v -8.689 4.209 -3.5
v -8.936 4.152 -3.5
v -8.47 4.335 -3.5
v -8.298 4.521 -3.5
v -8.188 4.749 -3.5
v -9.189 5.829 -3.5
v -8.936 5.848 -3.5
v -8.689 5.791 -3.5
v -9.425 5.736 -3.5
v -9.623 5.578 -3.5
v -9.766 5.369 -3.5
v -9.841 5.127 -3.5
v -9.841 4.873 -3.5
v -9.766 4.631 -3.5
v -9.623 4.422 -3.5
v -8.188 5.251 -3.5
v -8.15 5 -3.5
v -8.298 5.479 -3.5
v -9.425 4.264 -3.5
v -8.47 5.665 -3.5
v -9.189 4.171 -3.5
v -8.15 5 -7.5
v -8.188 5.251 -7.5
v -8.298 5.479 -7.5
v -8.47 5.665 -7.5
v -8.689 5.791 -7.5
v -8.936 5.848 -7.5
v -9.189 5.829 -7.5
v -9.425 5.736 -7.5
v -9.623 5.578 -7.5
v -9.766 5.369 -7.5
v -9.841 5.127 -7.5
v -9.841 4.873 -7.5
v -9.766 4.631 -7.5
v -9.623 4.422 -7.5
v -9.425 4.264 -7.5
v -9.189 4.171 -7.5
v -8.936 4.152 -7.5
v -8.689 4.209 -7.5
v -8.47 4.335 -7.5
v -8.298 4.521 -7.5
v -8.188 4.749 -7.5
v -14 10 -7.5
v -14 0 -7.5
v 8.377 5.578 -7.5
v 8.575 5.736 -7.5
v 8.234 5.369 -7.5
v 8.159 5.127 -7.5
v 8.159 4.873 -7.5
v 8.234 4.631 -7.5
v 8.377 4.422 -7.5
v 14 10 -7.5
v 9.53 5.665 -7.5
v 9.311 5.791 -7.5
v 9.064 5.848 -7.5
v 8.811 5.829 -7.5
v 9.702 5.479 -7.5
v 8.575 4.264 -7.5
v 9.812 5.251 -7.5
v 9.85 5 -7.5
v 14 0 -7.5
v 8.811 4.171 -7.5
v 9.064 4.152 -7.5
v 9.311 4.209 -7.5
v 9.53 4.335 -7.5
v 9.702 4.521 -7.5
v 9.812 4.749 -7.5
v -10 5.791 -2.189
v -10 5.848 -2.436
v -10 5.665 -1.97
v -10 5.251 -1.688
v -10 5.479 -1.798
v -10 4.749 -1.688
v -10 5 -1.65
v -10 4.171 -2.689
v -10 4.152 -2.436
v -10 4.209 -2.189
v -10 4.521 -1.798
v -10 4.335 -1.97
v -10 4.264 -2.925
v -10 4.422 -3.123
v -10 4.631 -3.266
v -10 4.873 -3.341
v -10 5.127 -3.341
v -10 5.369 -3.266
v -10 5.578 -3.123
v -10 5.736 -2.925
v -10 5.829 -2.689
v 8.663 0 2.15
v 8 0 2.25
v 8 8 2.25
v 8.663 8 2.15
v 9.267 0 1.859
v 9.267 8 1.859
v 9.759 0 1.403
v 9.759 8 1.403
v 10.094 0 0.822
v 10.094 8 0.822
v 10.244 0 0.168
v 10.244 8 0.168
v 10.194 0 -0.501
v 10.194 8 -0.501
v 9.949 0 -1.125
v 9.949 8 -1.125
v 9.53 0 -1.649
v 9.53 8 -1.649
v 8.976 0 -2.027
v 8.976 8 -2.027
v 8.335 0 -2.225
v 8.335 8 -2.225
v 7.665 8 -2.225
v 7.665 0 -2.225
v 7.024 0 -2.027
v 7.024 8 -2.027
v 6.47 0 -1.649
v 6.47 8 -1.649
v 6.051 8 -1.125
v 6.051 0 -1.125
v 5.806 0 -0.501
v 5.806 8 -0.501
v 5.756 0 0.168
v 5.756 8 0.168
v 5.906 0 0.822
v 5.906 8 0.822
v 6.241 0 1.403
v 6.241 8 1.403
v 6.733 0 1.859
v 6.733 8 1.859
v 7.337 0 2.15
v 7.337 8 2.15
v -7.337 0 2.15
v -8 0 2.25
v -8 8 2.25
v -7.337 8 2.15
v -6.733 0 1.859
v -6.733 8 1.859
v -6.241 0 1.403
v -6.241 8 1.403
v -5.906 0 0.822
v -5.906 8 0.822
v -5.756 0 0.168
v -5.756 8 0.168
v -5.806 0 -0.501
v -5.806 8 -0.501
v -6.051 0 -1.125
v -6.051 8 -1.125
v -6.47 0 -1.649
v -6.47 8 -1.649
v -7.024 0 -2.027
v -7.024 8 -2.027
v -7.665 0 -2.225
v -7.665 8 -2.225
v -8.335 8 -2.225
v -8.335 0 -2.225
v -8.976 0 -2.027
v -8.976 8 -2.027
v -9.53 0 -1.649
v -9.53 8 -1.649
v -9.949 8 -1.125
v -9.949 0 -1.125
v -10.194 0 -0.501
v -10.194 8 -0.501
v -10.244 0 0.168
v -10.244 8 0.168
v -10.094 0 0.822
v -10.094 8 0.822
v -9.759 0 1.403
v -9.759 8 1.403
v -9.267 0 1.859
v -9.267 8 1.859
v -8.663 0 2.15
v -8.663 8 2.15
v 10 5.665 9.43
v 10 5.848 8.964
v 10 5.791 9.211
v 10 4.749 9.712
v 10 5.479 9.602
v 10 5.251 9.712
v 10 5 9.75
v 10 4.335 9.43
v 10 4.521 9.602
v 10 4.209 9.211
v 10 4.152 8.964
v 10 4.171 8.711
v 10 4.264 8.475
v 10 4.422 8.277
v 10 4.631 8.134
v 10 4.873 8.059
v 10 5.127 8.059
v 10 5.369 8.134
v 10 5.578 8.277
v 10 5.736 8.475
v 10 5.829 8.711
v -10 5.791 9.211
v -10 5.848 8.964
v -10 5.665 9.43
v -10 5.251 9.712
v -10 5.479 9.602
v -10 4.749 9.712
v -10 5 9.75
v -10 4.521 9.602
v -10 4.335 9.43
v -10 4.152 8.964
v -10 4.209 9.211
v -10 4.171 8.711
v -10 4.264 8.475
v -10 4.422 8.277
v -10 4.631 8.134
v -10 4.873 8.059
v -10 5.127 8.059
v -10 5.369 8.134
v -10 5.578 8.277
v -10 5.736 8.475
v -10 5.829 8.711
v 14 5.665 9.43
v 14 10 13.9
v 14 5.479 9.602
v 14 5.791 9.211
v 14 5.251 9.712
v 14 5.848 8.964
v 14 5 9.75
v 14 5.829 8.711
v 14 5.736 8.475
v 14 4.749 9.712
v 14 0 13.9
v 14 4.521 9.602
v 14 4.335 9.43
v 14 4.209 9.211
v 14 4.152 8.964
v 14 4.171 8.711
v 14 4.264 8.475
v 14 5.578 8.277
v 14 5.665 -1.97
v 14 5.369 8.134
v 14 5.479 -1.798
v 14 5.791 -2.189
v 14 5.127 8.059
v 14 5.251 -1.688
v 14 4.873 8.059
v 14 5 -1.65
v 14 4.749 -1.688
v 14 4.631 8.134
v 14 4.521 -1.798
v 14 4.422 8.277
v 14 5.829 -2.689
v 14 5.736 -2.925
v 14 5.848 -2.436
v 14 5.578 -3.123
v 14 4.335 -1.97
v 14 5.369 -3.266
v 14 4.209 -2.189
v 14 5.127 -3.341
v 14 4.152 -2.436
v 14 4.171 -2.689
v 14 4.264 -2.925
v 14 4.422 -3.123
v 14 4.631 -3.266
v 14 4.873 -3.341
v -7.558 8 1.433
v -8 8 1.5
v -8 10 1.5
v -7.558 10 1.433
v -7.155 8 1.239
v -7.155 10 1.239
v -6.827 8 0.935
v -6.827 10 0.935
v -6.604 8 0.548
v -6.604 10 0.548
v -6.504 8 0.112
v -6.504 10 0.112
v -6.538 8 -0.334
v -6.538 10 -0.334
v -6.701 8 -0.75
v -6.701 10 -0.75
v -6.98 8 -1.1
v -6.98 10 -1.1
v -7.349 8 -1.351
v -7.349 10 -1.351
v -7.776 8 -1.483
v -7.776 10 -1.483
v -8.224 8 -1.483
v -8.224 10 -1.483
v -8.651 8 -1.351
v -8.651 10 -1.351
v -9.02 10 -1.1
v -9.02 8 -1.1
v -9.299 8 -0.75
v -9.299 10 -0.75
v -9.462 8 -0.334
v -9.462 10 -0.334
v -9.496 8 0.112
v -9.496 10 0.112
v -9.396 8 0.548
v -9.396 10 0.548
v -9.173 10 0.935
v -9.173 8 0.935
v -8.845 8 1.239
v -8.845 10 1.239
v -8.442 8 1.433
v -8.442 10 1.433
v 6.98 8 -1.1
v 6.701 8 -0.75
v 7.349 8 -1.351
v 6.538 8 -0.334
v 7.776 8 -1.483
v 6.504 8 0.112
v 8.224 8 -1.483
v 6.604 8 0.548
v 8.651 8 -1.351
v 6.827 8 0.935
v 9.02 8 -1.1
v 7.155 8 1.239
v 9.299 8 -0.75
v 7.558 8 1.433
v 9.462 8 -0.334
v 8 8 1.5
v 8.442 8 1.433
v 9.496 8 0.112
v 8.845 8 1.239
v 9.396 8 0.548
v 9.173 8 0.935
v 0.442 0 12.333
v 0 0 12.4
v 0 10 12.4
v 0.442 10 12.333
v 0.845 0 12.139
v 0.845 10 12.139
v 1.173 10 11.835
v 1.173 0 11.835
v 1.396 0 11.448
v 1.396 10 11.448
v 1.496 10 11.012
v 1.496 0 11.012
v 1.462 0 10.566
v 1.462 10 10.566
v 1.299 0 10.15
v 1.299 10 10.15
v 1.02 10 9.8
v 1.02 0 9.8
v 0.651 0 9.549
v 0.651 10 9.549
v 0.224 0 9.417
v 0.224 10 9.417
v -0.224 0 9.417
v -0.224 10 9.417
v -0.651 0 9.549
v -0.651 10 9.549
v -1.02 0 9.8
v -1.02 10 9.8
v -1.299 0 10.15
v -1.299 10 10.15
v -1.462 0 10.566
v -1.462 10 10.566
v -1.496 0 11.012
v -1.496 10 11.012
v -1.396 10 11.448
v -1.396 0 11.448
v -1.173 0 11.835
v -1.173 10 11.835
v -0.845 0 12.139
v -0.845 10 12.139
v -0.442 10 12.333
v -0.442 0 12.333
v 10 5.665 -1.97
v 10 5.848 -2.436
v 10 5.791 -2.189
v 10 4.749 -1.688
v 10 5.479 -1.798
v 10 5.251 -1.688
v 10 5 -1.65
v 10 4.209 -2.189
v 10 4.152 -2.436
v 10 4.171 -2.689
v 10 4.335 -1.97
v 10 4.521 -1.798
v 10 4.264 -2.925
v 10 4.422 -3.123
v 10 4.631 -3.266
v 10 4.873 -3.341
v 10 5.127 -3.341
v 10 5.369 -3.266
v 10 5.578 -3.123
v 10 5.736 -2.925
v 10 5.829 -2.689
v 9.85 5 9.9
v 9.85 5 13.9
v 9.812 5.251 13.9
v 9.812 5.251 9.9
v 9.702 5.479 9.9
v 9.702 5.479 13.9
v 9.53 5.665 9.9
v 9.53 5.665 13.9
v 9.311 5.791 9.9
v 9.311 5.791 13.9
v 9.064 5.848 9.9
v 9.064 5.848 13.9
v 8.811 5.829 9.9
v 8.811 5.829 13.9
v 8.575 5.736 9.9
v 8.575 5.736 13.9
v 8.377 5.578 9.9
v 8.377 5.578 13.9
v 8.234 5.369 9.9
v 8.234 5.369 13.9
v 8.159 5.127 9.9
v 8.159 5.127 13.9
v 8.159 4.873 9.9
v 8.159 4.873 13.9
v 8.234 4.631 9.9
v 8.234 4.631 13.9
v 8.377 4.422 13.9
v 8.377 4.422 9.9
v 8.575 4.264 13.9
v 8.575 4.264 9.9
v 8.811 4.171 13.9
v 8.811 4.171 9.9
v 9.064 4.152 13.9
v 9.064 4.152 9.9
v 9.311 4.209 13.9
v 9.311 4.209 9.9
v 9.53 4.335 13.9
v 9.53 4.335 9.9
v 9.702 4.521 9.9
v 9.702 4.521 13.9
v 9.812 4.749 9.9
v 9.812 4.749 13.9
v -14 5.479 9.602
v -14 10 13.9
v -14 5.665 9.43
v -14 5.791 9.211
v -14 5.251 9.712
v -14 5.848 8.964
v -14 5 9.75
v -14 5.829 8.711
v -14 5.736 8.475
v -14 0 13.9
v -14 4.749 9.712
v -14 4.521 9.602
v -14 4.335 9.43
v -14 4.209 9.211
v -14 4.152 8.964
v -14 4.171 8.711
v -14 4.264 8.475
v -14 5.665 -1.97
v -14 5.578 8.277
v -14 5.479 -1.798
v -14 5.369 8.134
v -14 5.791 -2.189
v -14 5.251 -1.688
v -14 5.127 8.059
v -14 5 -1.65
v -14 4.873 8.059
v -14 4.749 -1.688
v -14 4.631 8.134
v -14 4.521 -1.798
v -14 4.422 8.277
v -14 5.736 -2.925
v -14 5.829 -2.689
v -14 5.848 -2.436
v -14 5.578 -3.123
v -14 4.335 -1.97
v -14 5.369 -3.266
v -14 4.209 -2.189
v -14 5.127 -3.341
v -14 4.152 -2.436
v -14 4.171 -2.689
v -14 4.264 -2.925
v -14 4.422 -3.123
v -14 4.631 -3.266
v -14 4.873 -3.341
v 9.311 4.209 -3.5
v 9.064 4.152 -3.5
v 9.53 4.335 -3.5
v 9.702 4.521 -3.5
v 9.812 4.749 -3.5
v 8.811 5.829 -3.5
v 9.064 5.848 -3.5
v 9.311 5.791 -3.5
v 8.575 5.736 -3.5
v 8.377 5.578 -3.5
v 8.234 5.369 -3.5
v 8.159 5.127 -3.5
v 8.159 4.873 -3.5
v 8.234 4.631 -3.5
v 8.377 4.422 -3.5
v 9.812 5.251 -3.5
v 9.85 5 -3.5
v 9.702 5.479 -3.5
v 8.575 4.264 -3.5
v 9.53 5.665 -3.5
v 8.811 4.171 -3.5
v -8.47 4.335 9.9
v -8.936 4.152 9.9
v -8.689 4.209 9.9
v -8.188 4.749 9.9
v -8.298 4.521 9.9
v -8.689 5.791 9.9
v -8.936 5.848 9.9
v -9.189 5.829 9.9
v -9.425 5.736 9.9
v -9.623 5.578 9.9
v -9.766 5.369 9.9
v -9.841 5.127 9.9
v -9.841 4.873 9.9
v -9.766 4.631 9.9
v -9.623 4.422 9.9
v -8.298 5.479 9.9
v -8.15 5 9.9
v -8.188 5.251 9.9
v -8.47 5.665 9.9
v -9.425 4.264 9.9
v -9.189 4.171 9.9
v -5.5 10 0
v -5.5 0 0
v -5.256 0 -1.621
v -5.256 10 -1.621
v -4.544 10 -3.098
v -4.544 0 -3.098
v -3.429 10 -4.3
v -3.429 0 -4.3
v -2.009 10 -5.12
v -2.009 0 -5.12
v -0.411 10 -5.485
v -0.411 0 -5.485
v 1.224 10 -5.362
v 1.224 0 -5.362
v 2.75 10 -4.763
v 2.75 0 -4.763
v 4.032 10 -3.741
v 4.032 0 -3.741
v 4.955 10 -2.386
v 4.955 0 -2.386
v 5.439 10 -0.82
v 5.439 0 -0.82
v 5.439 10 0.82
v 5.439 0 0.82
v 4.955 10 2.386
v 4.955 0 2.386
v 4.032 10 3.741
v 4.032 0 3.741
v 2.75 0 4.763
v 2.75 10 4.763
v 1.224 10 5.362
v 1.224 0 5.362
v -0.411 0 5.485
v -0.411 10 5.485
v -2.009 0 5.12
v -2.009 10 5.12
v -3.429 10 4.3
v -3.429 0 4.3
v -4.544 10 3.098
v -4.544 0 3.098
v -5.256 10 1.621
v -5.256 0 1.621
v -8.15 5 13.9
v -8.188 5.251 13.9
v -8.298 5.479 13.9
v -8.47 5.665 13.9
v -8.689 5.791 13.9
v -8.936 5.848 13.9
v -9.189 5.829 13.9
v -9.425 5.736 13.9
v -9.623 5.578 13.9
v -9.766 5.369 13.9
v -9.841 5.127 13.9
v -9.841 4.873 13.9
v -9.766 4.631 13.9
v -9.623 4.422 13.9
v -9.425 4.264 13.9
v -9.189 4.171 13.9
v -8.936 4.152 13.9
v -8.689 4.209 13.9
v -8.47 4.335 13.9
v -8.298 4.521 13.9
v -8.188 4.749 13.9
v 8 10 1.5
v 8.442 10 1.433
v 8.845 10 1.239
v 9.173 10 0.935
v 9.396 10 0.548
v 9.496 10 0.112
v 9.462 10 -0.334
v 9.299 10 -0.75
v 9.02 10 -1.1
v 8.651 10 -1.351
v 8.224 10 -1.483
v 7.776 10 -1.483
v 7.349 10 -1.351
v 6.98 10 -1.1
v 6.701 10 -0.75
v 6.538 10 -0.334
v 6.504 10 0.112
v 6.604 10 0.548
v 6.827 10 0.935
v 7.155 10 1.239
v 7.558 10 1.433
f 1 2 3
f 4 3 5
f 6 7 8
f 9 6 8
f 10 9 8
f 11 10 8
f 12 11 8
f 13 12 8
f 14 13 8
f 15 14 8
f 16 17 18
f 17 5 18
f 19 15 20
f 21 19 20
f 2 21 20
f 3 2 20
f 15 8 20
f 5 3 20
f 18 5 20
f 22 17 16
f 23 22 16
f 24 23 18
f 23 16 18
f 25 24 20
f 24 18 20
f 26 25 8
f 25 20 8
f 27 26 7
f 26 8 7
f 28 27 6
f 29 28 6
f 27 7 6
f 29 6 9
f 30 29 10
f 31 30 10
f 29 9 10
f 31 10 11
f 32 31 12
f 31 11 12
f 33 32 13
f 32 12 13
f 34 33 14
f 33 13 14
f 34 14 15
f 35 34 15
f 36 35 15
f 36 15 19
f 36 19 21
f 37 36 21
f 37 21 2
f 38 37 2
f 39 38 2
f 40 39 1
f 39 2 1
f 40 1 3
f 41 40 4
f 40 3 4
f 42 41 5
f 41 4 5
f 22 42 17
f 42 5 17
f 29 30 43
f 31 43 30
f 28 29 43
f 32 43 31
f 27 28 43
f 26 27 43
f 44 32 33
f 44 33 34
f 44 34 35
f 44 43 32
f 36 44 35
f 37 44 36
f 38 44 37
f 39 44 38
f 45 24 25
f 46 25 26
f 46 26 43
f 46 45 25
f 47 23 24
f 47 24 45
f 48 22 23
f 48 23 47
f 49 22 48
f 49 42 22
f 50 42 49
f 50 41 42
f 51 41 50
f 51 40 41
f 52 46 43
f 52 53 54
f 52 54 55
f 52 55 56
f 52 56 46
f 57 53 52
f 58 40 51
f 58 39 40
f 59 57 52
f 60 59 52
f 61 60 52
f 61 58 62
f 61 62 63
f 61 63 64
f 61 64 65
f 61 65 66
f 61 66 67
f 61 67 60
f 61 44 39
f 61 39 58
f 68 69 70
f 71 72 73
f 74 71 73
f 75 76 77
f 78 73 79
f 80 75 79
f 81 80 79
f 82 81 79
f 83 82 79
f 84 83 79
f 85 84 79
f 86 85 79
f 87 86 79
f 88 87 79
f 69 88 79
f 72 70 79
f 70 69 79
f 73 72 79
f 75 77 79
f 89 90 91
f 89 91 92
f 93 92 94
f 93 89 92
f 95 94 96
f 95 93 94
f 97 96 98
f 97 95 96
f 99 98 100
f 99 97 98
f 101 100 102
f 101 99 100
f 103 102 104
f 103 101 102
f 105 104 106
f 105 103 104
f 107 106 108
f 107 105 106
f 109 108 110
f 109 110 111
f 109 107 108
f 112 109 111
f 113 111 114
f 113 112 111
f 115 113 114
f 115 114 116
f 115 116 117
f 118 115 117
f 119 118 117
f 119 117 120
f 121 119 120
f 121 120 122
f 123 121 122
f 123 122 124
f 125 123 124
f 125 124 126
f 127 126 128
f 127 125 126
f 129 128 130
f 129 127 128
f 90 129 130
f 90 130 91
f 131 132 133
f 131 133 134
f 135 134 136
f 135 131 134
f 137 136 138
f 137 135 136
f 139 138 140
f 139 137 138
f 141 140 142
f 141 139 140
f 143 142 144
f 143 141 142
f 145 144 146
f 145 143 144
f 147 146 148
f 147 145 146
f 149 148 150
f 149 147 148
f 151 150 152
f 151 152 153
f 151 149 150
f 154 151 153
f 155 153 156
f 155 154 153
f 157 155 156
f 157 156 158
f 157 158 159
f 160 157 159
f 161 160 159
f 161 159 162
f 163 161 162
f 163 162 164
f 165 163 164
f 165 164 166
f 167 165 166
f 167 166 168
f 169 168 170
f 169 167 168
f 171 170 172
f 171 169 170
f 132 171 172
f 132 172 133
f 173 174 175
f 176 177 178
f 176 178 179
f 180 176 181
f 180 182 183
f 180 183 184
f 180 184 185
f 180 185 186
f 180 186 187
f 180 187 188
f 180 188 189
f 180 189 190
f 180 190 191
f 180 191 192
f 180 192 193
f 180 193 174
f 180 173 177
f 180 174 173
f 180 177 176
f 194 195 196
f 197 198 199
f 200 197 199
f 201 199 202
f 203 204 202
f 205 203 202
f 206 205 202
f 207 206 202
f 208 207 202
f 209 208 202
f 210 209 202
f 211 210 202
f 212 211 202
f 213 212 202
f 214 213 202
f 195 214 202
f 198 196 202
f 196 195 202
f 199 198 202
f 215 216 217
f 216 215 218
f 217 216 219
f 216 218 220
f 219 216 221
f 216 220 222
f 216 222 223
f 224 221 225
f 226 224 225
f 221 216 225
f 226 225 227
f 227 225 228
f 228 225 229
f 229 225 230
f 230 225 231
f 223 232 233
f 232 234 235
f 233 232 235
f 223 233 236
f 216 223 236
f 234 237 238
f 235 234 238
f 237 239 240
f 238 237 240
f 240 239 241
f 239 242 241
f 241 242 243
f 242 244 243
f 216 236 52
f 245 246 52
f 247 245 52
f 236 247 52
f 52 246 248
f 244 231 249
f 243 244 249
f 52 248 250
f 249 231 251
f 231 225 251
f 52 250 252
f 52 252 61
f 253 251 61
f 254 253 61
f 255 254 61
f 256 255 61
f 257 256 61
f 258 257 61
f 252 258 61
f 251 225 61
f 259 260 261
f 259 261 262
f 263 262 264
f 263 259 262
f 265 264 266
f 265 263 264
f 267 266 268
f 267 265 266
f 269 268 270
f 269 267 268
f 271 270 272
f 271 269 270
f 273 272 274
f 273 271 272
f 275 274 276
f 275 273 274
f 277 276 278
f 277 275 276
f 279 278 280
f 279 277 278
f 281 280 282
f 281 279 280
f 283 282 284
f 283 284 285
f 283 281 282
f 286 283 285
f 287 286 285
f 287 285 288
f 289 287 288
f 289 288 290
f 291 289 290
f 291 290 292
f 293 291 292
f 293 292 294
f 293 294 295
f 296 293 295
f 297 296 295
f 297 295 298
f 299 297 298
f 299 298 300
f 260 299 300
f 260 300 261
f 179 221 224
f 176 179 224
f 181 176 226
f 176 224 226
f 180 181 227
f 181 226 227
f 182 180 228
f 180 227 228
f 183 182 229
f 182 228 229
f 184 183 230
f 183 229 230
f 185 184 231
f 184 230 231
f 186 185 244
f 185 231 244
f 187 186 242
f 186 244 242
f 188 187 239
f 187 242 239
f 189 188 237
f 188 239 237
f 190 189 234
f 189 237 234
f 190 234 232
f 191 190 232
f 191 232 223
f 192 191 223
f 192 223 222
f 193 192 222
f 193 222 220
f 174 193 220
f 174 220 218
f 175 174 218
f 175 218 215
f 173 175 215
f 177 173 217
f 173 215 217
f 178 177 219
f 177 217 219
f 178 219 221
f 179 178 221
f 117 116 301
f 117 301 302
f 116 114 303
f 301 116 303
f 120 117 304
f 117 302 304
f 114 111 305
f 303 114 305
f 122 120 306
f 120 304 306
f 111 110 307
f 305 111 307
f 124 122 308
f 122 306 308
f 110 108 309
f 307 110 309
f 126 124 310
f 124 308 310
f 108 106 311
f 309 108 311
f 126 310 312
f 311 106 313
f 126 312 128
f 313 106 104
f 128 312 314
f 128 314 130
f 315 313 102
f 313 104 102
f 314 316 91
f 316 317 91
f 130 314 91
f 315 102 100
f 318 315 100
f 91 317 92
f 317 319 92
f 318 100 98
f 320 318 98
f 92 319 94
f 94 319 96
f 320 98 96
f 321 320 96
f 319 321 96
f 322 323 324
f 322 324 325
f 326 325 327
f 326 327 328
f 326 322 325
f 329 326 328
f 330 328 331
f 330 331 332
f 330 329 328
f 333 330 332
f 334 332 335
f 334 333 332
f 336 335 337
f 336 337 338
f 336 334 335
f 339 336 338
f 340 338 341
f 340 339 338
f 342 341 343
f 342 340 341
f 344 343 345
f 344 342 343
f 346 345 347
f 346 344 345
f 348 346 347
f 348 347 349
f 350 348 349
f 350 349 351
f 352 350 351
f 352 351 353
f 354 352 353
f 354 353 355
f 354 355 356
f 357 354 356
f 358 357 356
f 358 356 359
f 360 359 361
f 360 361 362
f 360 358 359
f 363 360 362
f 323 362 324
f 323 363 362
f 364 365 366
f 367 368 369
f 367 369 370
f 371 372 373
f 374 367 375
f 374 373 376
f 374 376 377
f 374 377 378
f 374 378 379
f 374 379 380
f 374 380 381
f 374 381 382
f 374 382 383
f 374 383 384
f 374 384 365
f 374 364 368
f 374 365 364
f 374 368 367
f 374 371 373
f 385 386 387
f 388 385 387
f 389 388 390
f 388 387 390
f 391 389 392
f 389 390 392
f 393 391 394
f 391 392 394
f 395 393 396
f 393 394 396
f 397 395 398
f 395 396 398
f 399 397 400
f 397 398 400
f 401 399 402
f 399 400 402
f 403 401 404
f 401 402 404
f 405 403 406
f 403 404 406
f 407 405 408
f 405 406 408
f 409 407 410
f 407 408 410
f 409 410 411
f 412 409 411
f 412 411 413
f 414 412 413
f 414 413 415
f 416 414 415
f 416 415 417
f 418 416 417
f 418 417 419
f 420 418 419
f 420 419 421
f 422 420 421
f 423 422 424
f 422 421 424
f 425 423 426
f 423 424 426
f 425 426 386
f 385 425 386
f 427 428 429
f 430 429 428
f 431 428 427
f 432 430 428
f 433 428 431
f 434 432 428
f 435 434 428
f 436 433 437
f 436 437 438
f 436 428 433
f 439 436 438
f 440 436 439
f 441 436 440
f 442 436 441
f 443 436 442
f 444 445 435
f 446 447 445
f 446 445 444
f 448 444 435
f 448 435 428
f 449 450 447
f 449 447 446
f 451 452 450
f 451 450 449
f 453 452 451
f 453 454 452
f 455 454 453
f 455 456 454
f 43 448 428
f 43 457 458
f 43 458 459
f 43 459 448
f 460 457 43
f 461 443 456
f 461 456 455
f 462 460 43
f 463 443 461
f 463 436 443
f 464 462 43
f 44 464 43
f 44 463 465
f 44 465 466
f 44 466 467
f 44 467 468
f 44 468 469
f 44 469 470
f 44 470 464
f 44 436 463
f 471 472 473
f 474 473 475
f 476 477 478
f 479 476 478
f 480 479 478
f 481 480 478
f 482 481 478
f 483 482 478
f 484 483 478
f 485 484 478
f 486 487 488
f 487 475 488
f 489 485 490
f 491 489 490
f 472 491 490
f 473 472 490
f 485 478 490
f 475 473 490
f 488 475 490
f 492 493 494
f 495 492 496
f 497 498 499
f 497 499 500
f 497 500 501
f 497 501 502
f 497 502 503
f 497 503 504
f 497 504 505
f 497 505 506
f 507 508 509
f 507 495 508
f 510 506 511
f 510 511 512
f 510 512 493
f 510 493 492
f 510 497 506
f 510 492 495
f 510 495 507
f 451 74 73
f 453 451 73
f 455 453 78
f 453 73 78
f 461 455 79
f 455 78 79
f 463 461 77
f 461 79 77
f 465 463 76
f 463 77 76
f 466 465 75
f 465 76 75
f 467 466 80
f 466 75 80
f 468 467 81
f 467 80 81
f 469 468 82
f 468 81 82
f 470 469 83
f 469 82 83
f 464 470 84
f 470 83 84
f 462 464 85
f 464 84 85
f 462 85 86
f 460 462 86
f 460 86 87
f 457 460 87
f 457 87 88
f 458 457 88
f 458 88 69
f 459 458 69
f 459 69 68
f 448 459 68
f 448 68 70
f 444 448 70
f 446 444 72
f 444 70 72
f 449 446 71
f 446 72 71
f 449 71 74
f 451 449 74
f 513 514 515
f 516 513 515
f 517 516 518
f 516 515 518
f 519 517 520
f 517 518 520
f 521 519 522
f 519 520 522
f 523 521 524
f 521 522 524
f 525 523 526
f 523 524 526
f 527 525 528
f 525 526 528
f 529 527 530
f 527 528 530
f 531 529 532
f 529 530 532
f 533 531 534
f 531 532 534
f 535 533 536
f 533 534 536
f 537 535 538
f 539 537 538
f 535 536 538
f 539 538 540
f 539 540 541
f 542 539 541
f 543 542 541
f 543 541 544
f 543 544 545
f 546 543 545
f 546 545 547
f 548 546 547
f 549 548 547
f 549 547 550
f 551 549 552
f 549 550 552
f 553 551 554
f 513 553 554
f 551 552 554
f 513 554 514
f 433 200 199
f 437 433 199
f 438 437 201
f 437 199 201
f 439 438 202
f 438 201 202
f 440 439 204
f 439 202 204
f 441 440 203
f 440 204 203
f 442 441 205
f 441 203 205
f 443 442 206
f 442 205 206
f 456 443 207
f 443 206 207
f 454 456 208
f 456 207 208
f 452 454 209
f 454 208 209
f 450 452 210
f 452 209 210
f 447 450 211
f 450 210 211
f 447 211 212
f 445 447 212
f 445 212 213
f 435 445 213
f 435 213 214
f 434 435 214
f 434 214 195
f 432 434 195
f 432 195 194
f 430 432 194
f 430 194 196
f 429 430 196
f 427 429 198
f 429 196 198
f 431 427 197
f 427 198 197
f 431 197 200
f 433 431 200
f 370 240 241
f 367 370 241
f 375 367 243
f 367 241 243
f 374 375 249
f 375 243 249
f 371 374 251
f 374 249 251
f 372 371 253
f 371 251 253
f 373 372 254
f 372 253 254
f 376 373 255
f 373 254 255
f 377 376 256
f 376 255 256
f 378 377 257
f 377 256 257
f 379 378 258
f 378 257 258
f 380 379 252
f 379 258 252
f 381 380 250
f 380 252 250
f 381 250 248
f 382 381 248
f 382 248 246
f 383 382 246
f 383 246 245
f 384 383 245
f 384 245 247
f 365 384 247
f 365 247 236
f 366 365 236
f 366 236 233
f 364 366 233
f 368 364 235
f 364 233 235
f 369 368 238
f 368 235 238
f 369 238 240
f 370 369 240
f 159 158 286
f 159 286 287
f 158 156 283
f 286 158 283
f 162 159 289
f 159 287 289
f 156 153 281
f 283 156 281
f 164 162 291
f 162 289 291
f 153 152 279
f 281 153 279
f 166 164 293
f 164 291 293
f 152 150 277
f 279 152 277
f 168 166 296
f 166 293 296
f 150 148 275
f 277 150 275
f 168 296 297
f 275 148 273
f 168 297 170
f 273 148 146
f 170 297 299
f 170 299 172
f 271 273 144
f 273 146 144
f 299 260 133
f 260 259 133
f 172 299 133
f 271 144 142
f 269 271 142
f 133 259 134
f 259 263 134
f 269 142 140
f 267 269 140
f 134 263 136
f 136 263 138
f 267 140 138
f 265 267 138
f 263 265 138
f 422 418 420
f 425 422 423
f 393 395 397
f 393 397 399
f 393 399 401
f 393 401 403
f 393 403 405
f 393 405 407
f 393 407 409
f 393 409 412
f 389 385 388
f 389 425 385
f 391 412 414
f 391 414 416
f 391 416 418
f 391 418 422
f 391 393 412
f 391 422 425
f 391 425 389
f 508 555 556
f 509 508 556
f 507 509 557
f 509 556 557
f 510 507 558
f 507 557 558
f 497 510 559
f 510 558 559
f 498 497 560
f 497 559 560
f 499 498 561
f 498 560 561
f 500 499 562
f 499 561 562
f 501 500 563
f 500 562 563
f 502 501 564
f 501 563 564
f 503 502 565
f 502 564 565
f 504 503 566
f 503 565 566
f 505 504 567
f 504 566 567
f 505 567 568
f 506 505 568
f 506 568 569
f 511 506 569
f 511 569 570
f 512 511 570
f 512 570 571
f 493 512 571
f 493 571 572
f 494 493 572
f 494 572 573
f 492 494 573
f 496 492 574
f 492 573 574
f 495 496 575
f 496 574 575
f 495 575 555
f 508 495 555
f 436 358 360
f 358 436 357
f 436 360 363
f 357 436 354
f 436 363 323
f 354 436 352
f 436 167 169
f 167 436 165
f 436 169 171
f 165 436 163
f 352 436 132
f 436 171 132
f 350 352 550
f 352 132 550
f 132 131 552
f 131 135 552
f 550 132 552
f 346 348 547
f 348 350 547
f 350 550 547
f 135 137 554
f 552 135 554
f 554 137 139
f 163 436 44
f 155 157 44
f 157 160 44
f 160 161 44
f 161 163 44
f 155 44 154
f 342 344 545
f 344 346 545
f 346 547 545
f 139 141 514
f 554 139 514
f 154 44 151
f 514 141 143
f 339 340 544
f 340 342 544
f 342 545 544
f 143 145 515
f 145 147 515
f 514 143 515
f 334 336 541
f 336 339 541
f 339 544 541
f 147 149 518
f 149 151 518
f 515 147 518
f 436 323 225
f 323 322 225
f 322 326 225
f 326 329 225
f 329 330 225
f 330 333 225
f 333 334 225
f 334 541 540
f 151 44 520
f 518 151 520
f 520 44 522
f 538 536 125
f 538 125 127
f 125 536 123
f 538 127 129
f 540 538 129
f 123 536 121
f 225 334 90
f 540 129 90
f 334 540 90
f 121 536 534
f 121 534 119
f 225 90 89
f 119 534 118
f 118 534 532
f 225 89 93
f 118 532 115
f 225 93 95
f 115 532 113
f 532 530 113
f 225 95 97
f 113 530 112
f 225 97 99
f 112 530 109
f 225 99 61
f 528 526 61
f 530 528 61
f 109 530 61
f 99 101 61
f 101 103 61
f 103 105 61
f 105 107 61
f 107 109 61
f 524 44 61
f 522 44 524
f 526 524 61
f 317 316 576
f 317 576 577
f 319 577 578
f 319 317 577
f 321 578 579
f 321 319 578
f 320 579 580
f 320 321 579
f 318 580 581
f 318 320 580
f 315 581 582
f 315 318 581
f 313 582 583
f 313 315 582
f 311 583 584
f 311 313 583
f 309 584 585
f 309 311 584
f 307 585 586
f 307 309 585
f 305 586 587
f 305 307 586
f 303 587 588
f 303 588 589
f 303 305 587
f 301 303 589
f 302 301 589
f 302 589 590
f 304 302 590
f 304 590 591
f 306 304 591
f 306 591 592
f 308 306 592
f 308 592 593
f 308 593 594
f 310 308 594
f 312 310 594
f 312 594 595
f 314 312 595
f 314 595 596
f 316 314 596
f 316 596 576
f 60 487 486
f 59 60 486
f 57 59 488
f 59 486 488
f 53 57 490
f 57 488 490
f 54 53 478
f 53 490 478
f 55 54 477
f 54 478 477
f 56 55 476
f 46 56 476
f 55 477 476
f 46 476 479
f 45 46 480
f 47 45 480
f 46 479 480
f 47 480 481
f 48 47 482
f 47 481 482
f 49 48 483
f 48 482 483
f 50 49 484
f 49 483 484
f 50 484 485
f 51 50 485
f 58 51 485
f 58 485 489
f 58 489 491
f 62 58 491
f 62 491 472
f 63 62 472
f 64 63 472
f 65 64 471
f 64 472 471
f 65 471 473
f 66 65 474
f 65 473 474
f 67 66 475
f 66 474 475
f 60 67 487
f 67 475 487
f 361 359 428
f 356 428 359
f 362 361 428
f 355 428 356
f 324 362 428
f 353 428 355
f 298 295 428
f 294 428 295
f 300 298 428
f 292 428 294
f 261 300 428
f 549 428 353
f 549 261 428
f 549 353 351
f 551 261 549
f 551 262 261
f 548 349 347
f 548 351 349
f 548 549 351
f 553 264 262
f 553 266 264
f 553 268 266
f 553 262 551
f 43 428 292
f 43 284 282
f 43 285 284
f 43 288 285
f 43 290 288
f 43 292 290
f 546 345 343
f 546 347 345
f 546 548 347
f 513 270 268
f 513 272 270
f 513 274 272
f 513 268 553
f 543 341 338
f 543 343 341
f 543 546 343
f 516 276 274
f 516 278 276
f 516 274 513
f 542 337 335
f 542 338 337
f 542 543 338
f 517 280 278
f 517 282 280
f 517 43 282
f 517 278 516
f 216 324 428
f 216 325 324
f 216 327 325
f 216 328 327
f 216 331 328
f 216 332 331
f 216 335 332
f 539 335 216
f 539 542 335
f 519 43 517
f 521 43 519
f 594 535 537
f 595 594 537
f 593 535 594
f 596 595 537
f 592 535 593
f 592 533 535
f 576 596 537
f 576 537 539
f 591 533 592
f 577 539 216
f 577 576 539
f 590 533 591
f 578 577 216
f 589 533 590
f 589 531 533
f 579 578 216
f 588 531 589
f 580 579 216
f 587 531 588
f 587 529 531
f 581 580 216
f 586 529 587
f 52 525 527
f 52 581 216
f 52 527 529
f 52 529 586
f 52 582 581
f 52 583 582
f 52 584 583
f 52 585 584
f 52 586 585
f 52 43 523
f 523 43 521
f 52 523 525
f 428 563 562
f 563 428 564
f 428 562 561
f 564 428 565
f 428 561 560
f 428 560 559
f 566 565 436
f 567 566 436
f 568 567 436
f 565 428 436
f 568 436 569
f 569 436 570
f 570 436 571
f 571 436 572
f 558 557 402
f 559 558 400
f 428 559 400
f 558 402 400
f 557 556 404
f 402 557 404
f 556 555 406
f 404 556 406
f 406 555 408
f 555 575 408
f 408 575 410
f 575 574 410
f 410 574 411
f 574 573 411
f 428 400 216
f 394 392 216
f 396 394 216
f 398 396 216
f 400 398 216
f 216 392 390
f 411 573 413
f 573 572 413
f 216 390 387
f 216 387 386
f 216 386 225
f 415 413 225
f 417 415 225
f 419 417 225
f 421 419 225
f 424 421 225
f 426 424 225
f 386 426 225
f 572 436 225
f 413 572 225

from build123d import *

# Parameters (mm, degrees)
SKETCH_1_W          = 28
SKETCH_1_H          = 21.4
SKETCH_1_R          = 1.5
EXTRUDE_1_DEPTH     = 10
SKETCH_1_17_R       = 2.25
CUT_EXTRUDE_5_DEPTH = 8
CUT_EXTRUDE_START   = 14
SKETCH_2_R          = 0.85
CUT_EXTRUDE_1_DEPTH = 4
CUT_EXTRUDE_START_2 = -10
SKETCH_2_2_R        = 0.85
CUT_EXTRUDE_2_DEPTH = 4
CUT_EXTRUDE_START_3 = 13.9
SKETCH_3_R          = 0.85
CUT_EXTRUDE_3_DEPTH = 4
CUT_EXTRUDE_START_4 = -3.5
SKETCH_3_2_R        = 0.85
CUT_EXTRUDE_4_DEPTH = 4


with BuildPart() as part:
    # 草图1 → 凸台-拉伸1 (new body)
    with BuildSketch(Plane(origin=(0, 0, 0), x_dir=(1, 0, 0), z_dir=(0, 1, 0))):
        with Locations((0, -3.2)):
            Rectangle(SKETCH_1_W, SKETCH_1_H)
        with Locations(Location((-8, 0, 0), (0, 0, 270))):
            Circle(SKETCH_1_R, mode=Mode.SUBTRACT)
        with BuildLine():
            ThreePointArc((5.5, 0), (0, -5.5), (-5.5, 0))
            ThreePointArc((-5.5, 0), (0, 5.5), (5.5, 0))
        make_face(mode=Mode.SUBTRACT)
        with Locations(Location((8, 0, 0), (0, 0, 270))):
            Circle(SKETCH_1_R, mode=Mode.SUBTRACT)
        with Locations(Location((0, -10.9, 0), (0, 0, 270))):
            Circle(SKETCH_1_R, mode=Mode.SUBTRACT)
    extrude(amount=EXTRUDE_1_DEPTH)

    # 草图1<17> → 切除-拉伸5 (cut)
    with BuildSketch(Plane(origin=(0, 0, 0), x_dir=(1, 0, 0), z_dir=(0, 1, 0))):
        with Locations(Location((-8, 0, 0), (0, 0, 270))):
            Circle(SKETCH_1_17_R)
        with Locations(Location((8, 0, 0), (0, 0, 270))):
            Circle(SKETCH_1_17_R)
    extrude(amount=CUT_EXTRUDE_5_DEPTH, mode=Mode.SUBTRACT)

    # 草图2 → 切除-拉伸1 (cut)
    with BuildSketch(Plane(origin=(0, 0, 0), x_dir=(0, 0, -1), z_dir=(1, 0, 0)).offset(CUT_EXTRUDE_START)):
        with Locations(Location((-8.9, 5, 0), (0, 0, 180))):
            Circle(SKETCH_2_R)
        with Locations(Location((2.5, 5, 0), (0, 0, 180))):
            Circle(SKETCH_2_R)
    extrude(amount=-CUT_EXTRUDE_1_DEPTH, mode=Mode.SUBTRACT)

    # 草图2<2> → 切除-拉伸2 (cut)
    with BuildSketch(Plane(origin=(0, 0, 0), x_dir=(0, 0, -1), z_dir=(1, 0, 0)).offset(CUT_EXTRUDE_START_2)):
        with Locations(Location((-8.9, 5, 0), (0, 0, 180))):
            Circle(SKETCH_2_2_R)
        with Locations(Location((2.5, 5, 0), (0, 0, 180))):
            Circle(SKETCH_2_2_R)
    extrude(amount=-CUT_EXTRUDE_2_DEPTH, mode=Mode.SUBTRACT)

    # 草图3 → 切除-拉伸3 (cut)
    with BuildSketch(Plane.XY.offset(CUT_EXTRUDE_START_3)):
        with Locations((-9, 5)):
            Circle(SKETCH_3_R)
        with Locations((9, 5)):
            Circle(SKETCH_3_R)
    extrude(amount=-CUT_EXTRUDE_3_DEPTH, mode=Mode.SUBTRACT)

    # 草图3<2> → 切除-拉伸4 (cut)
    with BuildSketch(Plane.XY.offset(CUT_EXTRUDE_START_4)):
        with Locations((-9, 5)):
            Circle(SKETCH_3_2_R)
        with Locations((9, 5)):
            Circle(SKETCH_3_2_R)
    extrude(amount=-CUT_EXTRUDE_4_DEPTH, mode=Mode.SUBTRACT)


solid = part.part
